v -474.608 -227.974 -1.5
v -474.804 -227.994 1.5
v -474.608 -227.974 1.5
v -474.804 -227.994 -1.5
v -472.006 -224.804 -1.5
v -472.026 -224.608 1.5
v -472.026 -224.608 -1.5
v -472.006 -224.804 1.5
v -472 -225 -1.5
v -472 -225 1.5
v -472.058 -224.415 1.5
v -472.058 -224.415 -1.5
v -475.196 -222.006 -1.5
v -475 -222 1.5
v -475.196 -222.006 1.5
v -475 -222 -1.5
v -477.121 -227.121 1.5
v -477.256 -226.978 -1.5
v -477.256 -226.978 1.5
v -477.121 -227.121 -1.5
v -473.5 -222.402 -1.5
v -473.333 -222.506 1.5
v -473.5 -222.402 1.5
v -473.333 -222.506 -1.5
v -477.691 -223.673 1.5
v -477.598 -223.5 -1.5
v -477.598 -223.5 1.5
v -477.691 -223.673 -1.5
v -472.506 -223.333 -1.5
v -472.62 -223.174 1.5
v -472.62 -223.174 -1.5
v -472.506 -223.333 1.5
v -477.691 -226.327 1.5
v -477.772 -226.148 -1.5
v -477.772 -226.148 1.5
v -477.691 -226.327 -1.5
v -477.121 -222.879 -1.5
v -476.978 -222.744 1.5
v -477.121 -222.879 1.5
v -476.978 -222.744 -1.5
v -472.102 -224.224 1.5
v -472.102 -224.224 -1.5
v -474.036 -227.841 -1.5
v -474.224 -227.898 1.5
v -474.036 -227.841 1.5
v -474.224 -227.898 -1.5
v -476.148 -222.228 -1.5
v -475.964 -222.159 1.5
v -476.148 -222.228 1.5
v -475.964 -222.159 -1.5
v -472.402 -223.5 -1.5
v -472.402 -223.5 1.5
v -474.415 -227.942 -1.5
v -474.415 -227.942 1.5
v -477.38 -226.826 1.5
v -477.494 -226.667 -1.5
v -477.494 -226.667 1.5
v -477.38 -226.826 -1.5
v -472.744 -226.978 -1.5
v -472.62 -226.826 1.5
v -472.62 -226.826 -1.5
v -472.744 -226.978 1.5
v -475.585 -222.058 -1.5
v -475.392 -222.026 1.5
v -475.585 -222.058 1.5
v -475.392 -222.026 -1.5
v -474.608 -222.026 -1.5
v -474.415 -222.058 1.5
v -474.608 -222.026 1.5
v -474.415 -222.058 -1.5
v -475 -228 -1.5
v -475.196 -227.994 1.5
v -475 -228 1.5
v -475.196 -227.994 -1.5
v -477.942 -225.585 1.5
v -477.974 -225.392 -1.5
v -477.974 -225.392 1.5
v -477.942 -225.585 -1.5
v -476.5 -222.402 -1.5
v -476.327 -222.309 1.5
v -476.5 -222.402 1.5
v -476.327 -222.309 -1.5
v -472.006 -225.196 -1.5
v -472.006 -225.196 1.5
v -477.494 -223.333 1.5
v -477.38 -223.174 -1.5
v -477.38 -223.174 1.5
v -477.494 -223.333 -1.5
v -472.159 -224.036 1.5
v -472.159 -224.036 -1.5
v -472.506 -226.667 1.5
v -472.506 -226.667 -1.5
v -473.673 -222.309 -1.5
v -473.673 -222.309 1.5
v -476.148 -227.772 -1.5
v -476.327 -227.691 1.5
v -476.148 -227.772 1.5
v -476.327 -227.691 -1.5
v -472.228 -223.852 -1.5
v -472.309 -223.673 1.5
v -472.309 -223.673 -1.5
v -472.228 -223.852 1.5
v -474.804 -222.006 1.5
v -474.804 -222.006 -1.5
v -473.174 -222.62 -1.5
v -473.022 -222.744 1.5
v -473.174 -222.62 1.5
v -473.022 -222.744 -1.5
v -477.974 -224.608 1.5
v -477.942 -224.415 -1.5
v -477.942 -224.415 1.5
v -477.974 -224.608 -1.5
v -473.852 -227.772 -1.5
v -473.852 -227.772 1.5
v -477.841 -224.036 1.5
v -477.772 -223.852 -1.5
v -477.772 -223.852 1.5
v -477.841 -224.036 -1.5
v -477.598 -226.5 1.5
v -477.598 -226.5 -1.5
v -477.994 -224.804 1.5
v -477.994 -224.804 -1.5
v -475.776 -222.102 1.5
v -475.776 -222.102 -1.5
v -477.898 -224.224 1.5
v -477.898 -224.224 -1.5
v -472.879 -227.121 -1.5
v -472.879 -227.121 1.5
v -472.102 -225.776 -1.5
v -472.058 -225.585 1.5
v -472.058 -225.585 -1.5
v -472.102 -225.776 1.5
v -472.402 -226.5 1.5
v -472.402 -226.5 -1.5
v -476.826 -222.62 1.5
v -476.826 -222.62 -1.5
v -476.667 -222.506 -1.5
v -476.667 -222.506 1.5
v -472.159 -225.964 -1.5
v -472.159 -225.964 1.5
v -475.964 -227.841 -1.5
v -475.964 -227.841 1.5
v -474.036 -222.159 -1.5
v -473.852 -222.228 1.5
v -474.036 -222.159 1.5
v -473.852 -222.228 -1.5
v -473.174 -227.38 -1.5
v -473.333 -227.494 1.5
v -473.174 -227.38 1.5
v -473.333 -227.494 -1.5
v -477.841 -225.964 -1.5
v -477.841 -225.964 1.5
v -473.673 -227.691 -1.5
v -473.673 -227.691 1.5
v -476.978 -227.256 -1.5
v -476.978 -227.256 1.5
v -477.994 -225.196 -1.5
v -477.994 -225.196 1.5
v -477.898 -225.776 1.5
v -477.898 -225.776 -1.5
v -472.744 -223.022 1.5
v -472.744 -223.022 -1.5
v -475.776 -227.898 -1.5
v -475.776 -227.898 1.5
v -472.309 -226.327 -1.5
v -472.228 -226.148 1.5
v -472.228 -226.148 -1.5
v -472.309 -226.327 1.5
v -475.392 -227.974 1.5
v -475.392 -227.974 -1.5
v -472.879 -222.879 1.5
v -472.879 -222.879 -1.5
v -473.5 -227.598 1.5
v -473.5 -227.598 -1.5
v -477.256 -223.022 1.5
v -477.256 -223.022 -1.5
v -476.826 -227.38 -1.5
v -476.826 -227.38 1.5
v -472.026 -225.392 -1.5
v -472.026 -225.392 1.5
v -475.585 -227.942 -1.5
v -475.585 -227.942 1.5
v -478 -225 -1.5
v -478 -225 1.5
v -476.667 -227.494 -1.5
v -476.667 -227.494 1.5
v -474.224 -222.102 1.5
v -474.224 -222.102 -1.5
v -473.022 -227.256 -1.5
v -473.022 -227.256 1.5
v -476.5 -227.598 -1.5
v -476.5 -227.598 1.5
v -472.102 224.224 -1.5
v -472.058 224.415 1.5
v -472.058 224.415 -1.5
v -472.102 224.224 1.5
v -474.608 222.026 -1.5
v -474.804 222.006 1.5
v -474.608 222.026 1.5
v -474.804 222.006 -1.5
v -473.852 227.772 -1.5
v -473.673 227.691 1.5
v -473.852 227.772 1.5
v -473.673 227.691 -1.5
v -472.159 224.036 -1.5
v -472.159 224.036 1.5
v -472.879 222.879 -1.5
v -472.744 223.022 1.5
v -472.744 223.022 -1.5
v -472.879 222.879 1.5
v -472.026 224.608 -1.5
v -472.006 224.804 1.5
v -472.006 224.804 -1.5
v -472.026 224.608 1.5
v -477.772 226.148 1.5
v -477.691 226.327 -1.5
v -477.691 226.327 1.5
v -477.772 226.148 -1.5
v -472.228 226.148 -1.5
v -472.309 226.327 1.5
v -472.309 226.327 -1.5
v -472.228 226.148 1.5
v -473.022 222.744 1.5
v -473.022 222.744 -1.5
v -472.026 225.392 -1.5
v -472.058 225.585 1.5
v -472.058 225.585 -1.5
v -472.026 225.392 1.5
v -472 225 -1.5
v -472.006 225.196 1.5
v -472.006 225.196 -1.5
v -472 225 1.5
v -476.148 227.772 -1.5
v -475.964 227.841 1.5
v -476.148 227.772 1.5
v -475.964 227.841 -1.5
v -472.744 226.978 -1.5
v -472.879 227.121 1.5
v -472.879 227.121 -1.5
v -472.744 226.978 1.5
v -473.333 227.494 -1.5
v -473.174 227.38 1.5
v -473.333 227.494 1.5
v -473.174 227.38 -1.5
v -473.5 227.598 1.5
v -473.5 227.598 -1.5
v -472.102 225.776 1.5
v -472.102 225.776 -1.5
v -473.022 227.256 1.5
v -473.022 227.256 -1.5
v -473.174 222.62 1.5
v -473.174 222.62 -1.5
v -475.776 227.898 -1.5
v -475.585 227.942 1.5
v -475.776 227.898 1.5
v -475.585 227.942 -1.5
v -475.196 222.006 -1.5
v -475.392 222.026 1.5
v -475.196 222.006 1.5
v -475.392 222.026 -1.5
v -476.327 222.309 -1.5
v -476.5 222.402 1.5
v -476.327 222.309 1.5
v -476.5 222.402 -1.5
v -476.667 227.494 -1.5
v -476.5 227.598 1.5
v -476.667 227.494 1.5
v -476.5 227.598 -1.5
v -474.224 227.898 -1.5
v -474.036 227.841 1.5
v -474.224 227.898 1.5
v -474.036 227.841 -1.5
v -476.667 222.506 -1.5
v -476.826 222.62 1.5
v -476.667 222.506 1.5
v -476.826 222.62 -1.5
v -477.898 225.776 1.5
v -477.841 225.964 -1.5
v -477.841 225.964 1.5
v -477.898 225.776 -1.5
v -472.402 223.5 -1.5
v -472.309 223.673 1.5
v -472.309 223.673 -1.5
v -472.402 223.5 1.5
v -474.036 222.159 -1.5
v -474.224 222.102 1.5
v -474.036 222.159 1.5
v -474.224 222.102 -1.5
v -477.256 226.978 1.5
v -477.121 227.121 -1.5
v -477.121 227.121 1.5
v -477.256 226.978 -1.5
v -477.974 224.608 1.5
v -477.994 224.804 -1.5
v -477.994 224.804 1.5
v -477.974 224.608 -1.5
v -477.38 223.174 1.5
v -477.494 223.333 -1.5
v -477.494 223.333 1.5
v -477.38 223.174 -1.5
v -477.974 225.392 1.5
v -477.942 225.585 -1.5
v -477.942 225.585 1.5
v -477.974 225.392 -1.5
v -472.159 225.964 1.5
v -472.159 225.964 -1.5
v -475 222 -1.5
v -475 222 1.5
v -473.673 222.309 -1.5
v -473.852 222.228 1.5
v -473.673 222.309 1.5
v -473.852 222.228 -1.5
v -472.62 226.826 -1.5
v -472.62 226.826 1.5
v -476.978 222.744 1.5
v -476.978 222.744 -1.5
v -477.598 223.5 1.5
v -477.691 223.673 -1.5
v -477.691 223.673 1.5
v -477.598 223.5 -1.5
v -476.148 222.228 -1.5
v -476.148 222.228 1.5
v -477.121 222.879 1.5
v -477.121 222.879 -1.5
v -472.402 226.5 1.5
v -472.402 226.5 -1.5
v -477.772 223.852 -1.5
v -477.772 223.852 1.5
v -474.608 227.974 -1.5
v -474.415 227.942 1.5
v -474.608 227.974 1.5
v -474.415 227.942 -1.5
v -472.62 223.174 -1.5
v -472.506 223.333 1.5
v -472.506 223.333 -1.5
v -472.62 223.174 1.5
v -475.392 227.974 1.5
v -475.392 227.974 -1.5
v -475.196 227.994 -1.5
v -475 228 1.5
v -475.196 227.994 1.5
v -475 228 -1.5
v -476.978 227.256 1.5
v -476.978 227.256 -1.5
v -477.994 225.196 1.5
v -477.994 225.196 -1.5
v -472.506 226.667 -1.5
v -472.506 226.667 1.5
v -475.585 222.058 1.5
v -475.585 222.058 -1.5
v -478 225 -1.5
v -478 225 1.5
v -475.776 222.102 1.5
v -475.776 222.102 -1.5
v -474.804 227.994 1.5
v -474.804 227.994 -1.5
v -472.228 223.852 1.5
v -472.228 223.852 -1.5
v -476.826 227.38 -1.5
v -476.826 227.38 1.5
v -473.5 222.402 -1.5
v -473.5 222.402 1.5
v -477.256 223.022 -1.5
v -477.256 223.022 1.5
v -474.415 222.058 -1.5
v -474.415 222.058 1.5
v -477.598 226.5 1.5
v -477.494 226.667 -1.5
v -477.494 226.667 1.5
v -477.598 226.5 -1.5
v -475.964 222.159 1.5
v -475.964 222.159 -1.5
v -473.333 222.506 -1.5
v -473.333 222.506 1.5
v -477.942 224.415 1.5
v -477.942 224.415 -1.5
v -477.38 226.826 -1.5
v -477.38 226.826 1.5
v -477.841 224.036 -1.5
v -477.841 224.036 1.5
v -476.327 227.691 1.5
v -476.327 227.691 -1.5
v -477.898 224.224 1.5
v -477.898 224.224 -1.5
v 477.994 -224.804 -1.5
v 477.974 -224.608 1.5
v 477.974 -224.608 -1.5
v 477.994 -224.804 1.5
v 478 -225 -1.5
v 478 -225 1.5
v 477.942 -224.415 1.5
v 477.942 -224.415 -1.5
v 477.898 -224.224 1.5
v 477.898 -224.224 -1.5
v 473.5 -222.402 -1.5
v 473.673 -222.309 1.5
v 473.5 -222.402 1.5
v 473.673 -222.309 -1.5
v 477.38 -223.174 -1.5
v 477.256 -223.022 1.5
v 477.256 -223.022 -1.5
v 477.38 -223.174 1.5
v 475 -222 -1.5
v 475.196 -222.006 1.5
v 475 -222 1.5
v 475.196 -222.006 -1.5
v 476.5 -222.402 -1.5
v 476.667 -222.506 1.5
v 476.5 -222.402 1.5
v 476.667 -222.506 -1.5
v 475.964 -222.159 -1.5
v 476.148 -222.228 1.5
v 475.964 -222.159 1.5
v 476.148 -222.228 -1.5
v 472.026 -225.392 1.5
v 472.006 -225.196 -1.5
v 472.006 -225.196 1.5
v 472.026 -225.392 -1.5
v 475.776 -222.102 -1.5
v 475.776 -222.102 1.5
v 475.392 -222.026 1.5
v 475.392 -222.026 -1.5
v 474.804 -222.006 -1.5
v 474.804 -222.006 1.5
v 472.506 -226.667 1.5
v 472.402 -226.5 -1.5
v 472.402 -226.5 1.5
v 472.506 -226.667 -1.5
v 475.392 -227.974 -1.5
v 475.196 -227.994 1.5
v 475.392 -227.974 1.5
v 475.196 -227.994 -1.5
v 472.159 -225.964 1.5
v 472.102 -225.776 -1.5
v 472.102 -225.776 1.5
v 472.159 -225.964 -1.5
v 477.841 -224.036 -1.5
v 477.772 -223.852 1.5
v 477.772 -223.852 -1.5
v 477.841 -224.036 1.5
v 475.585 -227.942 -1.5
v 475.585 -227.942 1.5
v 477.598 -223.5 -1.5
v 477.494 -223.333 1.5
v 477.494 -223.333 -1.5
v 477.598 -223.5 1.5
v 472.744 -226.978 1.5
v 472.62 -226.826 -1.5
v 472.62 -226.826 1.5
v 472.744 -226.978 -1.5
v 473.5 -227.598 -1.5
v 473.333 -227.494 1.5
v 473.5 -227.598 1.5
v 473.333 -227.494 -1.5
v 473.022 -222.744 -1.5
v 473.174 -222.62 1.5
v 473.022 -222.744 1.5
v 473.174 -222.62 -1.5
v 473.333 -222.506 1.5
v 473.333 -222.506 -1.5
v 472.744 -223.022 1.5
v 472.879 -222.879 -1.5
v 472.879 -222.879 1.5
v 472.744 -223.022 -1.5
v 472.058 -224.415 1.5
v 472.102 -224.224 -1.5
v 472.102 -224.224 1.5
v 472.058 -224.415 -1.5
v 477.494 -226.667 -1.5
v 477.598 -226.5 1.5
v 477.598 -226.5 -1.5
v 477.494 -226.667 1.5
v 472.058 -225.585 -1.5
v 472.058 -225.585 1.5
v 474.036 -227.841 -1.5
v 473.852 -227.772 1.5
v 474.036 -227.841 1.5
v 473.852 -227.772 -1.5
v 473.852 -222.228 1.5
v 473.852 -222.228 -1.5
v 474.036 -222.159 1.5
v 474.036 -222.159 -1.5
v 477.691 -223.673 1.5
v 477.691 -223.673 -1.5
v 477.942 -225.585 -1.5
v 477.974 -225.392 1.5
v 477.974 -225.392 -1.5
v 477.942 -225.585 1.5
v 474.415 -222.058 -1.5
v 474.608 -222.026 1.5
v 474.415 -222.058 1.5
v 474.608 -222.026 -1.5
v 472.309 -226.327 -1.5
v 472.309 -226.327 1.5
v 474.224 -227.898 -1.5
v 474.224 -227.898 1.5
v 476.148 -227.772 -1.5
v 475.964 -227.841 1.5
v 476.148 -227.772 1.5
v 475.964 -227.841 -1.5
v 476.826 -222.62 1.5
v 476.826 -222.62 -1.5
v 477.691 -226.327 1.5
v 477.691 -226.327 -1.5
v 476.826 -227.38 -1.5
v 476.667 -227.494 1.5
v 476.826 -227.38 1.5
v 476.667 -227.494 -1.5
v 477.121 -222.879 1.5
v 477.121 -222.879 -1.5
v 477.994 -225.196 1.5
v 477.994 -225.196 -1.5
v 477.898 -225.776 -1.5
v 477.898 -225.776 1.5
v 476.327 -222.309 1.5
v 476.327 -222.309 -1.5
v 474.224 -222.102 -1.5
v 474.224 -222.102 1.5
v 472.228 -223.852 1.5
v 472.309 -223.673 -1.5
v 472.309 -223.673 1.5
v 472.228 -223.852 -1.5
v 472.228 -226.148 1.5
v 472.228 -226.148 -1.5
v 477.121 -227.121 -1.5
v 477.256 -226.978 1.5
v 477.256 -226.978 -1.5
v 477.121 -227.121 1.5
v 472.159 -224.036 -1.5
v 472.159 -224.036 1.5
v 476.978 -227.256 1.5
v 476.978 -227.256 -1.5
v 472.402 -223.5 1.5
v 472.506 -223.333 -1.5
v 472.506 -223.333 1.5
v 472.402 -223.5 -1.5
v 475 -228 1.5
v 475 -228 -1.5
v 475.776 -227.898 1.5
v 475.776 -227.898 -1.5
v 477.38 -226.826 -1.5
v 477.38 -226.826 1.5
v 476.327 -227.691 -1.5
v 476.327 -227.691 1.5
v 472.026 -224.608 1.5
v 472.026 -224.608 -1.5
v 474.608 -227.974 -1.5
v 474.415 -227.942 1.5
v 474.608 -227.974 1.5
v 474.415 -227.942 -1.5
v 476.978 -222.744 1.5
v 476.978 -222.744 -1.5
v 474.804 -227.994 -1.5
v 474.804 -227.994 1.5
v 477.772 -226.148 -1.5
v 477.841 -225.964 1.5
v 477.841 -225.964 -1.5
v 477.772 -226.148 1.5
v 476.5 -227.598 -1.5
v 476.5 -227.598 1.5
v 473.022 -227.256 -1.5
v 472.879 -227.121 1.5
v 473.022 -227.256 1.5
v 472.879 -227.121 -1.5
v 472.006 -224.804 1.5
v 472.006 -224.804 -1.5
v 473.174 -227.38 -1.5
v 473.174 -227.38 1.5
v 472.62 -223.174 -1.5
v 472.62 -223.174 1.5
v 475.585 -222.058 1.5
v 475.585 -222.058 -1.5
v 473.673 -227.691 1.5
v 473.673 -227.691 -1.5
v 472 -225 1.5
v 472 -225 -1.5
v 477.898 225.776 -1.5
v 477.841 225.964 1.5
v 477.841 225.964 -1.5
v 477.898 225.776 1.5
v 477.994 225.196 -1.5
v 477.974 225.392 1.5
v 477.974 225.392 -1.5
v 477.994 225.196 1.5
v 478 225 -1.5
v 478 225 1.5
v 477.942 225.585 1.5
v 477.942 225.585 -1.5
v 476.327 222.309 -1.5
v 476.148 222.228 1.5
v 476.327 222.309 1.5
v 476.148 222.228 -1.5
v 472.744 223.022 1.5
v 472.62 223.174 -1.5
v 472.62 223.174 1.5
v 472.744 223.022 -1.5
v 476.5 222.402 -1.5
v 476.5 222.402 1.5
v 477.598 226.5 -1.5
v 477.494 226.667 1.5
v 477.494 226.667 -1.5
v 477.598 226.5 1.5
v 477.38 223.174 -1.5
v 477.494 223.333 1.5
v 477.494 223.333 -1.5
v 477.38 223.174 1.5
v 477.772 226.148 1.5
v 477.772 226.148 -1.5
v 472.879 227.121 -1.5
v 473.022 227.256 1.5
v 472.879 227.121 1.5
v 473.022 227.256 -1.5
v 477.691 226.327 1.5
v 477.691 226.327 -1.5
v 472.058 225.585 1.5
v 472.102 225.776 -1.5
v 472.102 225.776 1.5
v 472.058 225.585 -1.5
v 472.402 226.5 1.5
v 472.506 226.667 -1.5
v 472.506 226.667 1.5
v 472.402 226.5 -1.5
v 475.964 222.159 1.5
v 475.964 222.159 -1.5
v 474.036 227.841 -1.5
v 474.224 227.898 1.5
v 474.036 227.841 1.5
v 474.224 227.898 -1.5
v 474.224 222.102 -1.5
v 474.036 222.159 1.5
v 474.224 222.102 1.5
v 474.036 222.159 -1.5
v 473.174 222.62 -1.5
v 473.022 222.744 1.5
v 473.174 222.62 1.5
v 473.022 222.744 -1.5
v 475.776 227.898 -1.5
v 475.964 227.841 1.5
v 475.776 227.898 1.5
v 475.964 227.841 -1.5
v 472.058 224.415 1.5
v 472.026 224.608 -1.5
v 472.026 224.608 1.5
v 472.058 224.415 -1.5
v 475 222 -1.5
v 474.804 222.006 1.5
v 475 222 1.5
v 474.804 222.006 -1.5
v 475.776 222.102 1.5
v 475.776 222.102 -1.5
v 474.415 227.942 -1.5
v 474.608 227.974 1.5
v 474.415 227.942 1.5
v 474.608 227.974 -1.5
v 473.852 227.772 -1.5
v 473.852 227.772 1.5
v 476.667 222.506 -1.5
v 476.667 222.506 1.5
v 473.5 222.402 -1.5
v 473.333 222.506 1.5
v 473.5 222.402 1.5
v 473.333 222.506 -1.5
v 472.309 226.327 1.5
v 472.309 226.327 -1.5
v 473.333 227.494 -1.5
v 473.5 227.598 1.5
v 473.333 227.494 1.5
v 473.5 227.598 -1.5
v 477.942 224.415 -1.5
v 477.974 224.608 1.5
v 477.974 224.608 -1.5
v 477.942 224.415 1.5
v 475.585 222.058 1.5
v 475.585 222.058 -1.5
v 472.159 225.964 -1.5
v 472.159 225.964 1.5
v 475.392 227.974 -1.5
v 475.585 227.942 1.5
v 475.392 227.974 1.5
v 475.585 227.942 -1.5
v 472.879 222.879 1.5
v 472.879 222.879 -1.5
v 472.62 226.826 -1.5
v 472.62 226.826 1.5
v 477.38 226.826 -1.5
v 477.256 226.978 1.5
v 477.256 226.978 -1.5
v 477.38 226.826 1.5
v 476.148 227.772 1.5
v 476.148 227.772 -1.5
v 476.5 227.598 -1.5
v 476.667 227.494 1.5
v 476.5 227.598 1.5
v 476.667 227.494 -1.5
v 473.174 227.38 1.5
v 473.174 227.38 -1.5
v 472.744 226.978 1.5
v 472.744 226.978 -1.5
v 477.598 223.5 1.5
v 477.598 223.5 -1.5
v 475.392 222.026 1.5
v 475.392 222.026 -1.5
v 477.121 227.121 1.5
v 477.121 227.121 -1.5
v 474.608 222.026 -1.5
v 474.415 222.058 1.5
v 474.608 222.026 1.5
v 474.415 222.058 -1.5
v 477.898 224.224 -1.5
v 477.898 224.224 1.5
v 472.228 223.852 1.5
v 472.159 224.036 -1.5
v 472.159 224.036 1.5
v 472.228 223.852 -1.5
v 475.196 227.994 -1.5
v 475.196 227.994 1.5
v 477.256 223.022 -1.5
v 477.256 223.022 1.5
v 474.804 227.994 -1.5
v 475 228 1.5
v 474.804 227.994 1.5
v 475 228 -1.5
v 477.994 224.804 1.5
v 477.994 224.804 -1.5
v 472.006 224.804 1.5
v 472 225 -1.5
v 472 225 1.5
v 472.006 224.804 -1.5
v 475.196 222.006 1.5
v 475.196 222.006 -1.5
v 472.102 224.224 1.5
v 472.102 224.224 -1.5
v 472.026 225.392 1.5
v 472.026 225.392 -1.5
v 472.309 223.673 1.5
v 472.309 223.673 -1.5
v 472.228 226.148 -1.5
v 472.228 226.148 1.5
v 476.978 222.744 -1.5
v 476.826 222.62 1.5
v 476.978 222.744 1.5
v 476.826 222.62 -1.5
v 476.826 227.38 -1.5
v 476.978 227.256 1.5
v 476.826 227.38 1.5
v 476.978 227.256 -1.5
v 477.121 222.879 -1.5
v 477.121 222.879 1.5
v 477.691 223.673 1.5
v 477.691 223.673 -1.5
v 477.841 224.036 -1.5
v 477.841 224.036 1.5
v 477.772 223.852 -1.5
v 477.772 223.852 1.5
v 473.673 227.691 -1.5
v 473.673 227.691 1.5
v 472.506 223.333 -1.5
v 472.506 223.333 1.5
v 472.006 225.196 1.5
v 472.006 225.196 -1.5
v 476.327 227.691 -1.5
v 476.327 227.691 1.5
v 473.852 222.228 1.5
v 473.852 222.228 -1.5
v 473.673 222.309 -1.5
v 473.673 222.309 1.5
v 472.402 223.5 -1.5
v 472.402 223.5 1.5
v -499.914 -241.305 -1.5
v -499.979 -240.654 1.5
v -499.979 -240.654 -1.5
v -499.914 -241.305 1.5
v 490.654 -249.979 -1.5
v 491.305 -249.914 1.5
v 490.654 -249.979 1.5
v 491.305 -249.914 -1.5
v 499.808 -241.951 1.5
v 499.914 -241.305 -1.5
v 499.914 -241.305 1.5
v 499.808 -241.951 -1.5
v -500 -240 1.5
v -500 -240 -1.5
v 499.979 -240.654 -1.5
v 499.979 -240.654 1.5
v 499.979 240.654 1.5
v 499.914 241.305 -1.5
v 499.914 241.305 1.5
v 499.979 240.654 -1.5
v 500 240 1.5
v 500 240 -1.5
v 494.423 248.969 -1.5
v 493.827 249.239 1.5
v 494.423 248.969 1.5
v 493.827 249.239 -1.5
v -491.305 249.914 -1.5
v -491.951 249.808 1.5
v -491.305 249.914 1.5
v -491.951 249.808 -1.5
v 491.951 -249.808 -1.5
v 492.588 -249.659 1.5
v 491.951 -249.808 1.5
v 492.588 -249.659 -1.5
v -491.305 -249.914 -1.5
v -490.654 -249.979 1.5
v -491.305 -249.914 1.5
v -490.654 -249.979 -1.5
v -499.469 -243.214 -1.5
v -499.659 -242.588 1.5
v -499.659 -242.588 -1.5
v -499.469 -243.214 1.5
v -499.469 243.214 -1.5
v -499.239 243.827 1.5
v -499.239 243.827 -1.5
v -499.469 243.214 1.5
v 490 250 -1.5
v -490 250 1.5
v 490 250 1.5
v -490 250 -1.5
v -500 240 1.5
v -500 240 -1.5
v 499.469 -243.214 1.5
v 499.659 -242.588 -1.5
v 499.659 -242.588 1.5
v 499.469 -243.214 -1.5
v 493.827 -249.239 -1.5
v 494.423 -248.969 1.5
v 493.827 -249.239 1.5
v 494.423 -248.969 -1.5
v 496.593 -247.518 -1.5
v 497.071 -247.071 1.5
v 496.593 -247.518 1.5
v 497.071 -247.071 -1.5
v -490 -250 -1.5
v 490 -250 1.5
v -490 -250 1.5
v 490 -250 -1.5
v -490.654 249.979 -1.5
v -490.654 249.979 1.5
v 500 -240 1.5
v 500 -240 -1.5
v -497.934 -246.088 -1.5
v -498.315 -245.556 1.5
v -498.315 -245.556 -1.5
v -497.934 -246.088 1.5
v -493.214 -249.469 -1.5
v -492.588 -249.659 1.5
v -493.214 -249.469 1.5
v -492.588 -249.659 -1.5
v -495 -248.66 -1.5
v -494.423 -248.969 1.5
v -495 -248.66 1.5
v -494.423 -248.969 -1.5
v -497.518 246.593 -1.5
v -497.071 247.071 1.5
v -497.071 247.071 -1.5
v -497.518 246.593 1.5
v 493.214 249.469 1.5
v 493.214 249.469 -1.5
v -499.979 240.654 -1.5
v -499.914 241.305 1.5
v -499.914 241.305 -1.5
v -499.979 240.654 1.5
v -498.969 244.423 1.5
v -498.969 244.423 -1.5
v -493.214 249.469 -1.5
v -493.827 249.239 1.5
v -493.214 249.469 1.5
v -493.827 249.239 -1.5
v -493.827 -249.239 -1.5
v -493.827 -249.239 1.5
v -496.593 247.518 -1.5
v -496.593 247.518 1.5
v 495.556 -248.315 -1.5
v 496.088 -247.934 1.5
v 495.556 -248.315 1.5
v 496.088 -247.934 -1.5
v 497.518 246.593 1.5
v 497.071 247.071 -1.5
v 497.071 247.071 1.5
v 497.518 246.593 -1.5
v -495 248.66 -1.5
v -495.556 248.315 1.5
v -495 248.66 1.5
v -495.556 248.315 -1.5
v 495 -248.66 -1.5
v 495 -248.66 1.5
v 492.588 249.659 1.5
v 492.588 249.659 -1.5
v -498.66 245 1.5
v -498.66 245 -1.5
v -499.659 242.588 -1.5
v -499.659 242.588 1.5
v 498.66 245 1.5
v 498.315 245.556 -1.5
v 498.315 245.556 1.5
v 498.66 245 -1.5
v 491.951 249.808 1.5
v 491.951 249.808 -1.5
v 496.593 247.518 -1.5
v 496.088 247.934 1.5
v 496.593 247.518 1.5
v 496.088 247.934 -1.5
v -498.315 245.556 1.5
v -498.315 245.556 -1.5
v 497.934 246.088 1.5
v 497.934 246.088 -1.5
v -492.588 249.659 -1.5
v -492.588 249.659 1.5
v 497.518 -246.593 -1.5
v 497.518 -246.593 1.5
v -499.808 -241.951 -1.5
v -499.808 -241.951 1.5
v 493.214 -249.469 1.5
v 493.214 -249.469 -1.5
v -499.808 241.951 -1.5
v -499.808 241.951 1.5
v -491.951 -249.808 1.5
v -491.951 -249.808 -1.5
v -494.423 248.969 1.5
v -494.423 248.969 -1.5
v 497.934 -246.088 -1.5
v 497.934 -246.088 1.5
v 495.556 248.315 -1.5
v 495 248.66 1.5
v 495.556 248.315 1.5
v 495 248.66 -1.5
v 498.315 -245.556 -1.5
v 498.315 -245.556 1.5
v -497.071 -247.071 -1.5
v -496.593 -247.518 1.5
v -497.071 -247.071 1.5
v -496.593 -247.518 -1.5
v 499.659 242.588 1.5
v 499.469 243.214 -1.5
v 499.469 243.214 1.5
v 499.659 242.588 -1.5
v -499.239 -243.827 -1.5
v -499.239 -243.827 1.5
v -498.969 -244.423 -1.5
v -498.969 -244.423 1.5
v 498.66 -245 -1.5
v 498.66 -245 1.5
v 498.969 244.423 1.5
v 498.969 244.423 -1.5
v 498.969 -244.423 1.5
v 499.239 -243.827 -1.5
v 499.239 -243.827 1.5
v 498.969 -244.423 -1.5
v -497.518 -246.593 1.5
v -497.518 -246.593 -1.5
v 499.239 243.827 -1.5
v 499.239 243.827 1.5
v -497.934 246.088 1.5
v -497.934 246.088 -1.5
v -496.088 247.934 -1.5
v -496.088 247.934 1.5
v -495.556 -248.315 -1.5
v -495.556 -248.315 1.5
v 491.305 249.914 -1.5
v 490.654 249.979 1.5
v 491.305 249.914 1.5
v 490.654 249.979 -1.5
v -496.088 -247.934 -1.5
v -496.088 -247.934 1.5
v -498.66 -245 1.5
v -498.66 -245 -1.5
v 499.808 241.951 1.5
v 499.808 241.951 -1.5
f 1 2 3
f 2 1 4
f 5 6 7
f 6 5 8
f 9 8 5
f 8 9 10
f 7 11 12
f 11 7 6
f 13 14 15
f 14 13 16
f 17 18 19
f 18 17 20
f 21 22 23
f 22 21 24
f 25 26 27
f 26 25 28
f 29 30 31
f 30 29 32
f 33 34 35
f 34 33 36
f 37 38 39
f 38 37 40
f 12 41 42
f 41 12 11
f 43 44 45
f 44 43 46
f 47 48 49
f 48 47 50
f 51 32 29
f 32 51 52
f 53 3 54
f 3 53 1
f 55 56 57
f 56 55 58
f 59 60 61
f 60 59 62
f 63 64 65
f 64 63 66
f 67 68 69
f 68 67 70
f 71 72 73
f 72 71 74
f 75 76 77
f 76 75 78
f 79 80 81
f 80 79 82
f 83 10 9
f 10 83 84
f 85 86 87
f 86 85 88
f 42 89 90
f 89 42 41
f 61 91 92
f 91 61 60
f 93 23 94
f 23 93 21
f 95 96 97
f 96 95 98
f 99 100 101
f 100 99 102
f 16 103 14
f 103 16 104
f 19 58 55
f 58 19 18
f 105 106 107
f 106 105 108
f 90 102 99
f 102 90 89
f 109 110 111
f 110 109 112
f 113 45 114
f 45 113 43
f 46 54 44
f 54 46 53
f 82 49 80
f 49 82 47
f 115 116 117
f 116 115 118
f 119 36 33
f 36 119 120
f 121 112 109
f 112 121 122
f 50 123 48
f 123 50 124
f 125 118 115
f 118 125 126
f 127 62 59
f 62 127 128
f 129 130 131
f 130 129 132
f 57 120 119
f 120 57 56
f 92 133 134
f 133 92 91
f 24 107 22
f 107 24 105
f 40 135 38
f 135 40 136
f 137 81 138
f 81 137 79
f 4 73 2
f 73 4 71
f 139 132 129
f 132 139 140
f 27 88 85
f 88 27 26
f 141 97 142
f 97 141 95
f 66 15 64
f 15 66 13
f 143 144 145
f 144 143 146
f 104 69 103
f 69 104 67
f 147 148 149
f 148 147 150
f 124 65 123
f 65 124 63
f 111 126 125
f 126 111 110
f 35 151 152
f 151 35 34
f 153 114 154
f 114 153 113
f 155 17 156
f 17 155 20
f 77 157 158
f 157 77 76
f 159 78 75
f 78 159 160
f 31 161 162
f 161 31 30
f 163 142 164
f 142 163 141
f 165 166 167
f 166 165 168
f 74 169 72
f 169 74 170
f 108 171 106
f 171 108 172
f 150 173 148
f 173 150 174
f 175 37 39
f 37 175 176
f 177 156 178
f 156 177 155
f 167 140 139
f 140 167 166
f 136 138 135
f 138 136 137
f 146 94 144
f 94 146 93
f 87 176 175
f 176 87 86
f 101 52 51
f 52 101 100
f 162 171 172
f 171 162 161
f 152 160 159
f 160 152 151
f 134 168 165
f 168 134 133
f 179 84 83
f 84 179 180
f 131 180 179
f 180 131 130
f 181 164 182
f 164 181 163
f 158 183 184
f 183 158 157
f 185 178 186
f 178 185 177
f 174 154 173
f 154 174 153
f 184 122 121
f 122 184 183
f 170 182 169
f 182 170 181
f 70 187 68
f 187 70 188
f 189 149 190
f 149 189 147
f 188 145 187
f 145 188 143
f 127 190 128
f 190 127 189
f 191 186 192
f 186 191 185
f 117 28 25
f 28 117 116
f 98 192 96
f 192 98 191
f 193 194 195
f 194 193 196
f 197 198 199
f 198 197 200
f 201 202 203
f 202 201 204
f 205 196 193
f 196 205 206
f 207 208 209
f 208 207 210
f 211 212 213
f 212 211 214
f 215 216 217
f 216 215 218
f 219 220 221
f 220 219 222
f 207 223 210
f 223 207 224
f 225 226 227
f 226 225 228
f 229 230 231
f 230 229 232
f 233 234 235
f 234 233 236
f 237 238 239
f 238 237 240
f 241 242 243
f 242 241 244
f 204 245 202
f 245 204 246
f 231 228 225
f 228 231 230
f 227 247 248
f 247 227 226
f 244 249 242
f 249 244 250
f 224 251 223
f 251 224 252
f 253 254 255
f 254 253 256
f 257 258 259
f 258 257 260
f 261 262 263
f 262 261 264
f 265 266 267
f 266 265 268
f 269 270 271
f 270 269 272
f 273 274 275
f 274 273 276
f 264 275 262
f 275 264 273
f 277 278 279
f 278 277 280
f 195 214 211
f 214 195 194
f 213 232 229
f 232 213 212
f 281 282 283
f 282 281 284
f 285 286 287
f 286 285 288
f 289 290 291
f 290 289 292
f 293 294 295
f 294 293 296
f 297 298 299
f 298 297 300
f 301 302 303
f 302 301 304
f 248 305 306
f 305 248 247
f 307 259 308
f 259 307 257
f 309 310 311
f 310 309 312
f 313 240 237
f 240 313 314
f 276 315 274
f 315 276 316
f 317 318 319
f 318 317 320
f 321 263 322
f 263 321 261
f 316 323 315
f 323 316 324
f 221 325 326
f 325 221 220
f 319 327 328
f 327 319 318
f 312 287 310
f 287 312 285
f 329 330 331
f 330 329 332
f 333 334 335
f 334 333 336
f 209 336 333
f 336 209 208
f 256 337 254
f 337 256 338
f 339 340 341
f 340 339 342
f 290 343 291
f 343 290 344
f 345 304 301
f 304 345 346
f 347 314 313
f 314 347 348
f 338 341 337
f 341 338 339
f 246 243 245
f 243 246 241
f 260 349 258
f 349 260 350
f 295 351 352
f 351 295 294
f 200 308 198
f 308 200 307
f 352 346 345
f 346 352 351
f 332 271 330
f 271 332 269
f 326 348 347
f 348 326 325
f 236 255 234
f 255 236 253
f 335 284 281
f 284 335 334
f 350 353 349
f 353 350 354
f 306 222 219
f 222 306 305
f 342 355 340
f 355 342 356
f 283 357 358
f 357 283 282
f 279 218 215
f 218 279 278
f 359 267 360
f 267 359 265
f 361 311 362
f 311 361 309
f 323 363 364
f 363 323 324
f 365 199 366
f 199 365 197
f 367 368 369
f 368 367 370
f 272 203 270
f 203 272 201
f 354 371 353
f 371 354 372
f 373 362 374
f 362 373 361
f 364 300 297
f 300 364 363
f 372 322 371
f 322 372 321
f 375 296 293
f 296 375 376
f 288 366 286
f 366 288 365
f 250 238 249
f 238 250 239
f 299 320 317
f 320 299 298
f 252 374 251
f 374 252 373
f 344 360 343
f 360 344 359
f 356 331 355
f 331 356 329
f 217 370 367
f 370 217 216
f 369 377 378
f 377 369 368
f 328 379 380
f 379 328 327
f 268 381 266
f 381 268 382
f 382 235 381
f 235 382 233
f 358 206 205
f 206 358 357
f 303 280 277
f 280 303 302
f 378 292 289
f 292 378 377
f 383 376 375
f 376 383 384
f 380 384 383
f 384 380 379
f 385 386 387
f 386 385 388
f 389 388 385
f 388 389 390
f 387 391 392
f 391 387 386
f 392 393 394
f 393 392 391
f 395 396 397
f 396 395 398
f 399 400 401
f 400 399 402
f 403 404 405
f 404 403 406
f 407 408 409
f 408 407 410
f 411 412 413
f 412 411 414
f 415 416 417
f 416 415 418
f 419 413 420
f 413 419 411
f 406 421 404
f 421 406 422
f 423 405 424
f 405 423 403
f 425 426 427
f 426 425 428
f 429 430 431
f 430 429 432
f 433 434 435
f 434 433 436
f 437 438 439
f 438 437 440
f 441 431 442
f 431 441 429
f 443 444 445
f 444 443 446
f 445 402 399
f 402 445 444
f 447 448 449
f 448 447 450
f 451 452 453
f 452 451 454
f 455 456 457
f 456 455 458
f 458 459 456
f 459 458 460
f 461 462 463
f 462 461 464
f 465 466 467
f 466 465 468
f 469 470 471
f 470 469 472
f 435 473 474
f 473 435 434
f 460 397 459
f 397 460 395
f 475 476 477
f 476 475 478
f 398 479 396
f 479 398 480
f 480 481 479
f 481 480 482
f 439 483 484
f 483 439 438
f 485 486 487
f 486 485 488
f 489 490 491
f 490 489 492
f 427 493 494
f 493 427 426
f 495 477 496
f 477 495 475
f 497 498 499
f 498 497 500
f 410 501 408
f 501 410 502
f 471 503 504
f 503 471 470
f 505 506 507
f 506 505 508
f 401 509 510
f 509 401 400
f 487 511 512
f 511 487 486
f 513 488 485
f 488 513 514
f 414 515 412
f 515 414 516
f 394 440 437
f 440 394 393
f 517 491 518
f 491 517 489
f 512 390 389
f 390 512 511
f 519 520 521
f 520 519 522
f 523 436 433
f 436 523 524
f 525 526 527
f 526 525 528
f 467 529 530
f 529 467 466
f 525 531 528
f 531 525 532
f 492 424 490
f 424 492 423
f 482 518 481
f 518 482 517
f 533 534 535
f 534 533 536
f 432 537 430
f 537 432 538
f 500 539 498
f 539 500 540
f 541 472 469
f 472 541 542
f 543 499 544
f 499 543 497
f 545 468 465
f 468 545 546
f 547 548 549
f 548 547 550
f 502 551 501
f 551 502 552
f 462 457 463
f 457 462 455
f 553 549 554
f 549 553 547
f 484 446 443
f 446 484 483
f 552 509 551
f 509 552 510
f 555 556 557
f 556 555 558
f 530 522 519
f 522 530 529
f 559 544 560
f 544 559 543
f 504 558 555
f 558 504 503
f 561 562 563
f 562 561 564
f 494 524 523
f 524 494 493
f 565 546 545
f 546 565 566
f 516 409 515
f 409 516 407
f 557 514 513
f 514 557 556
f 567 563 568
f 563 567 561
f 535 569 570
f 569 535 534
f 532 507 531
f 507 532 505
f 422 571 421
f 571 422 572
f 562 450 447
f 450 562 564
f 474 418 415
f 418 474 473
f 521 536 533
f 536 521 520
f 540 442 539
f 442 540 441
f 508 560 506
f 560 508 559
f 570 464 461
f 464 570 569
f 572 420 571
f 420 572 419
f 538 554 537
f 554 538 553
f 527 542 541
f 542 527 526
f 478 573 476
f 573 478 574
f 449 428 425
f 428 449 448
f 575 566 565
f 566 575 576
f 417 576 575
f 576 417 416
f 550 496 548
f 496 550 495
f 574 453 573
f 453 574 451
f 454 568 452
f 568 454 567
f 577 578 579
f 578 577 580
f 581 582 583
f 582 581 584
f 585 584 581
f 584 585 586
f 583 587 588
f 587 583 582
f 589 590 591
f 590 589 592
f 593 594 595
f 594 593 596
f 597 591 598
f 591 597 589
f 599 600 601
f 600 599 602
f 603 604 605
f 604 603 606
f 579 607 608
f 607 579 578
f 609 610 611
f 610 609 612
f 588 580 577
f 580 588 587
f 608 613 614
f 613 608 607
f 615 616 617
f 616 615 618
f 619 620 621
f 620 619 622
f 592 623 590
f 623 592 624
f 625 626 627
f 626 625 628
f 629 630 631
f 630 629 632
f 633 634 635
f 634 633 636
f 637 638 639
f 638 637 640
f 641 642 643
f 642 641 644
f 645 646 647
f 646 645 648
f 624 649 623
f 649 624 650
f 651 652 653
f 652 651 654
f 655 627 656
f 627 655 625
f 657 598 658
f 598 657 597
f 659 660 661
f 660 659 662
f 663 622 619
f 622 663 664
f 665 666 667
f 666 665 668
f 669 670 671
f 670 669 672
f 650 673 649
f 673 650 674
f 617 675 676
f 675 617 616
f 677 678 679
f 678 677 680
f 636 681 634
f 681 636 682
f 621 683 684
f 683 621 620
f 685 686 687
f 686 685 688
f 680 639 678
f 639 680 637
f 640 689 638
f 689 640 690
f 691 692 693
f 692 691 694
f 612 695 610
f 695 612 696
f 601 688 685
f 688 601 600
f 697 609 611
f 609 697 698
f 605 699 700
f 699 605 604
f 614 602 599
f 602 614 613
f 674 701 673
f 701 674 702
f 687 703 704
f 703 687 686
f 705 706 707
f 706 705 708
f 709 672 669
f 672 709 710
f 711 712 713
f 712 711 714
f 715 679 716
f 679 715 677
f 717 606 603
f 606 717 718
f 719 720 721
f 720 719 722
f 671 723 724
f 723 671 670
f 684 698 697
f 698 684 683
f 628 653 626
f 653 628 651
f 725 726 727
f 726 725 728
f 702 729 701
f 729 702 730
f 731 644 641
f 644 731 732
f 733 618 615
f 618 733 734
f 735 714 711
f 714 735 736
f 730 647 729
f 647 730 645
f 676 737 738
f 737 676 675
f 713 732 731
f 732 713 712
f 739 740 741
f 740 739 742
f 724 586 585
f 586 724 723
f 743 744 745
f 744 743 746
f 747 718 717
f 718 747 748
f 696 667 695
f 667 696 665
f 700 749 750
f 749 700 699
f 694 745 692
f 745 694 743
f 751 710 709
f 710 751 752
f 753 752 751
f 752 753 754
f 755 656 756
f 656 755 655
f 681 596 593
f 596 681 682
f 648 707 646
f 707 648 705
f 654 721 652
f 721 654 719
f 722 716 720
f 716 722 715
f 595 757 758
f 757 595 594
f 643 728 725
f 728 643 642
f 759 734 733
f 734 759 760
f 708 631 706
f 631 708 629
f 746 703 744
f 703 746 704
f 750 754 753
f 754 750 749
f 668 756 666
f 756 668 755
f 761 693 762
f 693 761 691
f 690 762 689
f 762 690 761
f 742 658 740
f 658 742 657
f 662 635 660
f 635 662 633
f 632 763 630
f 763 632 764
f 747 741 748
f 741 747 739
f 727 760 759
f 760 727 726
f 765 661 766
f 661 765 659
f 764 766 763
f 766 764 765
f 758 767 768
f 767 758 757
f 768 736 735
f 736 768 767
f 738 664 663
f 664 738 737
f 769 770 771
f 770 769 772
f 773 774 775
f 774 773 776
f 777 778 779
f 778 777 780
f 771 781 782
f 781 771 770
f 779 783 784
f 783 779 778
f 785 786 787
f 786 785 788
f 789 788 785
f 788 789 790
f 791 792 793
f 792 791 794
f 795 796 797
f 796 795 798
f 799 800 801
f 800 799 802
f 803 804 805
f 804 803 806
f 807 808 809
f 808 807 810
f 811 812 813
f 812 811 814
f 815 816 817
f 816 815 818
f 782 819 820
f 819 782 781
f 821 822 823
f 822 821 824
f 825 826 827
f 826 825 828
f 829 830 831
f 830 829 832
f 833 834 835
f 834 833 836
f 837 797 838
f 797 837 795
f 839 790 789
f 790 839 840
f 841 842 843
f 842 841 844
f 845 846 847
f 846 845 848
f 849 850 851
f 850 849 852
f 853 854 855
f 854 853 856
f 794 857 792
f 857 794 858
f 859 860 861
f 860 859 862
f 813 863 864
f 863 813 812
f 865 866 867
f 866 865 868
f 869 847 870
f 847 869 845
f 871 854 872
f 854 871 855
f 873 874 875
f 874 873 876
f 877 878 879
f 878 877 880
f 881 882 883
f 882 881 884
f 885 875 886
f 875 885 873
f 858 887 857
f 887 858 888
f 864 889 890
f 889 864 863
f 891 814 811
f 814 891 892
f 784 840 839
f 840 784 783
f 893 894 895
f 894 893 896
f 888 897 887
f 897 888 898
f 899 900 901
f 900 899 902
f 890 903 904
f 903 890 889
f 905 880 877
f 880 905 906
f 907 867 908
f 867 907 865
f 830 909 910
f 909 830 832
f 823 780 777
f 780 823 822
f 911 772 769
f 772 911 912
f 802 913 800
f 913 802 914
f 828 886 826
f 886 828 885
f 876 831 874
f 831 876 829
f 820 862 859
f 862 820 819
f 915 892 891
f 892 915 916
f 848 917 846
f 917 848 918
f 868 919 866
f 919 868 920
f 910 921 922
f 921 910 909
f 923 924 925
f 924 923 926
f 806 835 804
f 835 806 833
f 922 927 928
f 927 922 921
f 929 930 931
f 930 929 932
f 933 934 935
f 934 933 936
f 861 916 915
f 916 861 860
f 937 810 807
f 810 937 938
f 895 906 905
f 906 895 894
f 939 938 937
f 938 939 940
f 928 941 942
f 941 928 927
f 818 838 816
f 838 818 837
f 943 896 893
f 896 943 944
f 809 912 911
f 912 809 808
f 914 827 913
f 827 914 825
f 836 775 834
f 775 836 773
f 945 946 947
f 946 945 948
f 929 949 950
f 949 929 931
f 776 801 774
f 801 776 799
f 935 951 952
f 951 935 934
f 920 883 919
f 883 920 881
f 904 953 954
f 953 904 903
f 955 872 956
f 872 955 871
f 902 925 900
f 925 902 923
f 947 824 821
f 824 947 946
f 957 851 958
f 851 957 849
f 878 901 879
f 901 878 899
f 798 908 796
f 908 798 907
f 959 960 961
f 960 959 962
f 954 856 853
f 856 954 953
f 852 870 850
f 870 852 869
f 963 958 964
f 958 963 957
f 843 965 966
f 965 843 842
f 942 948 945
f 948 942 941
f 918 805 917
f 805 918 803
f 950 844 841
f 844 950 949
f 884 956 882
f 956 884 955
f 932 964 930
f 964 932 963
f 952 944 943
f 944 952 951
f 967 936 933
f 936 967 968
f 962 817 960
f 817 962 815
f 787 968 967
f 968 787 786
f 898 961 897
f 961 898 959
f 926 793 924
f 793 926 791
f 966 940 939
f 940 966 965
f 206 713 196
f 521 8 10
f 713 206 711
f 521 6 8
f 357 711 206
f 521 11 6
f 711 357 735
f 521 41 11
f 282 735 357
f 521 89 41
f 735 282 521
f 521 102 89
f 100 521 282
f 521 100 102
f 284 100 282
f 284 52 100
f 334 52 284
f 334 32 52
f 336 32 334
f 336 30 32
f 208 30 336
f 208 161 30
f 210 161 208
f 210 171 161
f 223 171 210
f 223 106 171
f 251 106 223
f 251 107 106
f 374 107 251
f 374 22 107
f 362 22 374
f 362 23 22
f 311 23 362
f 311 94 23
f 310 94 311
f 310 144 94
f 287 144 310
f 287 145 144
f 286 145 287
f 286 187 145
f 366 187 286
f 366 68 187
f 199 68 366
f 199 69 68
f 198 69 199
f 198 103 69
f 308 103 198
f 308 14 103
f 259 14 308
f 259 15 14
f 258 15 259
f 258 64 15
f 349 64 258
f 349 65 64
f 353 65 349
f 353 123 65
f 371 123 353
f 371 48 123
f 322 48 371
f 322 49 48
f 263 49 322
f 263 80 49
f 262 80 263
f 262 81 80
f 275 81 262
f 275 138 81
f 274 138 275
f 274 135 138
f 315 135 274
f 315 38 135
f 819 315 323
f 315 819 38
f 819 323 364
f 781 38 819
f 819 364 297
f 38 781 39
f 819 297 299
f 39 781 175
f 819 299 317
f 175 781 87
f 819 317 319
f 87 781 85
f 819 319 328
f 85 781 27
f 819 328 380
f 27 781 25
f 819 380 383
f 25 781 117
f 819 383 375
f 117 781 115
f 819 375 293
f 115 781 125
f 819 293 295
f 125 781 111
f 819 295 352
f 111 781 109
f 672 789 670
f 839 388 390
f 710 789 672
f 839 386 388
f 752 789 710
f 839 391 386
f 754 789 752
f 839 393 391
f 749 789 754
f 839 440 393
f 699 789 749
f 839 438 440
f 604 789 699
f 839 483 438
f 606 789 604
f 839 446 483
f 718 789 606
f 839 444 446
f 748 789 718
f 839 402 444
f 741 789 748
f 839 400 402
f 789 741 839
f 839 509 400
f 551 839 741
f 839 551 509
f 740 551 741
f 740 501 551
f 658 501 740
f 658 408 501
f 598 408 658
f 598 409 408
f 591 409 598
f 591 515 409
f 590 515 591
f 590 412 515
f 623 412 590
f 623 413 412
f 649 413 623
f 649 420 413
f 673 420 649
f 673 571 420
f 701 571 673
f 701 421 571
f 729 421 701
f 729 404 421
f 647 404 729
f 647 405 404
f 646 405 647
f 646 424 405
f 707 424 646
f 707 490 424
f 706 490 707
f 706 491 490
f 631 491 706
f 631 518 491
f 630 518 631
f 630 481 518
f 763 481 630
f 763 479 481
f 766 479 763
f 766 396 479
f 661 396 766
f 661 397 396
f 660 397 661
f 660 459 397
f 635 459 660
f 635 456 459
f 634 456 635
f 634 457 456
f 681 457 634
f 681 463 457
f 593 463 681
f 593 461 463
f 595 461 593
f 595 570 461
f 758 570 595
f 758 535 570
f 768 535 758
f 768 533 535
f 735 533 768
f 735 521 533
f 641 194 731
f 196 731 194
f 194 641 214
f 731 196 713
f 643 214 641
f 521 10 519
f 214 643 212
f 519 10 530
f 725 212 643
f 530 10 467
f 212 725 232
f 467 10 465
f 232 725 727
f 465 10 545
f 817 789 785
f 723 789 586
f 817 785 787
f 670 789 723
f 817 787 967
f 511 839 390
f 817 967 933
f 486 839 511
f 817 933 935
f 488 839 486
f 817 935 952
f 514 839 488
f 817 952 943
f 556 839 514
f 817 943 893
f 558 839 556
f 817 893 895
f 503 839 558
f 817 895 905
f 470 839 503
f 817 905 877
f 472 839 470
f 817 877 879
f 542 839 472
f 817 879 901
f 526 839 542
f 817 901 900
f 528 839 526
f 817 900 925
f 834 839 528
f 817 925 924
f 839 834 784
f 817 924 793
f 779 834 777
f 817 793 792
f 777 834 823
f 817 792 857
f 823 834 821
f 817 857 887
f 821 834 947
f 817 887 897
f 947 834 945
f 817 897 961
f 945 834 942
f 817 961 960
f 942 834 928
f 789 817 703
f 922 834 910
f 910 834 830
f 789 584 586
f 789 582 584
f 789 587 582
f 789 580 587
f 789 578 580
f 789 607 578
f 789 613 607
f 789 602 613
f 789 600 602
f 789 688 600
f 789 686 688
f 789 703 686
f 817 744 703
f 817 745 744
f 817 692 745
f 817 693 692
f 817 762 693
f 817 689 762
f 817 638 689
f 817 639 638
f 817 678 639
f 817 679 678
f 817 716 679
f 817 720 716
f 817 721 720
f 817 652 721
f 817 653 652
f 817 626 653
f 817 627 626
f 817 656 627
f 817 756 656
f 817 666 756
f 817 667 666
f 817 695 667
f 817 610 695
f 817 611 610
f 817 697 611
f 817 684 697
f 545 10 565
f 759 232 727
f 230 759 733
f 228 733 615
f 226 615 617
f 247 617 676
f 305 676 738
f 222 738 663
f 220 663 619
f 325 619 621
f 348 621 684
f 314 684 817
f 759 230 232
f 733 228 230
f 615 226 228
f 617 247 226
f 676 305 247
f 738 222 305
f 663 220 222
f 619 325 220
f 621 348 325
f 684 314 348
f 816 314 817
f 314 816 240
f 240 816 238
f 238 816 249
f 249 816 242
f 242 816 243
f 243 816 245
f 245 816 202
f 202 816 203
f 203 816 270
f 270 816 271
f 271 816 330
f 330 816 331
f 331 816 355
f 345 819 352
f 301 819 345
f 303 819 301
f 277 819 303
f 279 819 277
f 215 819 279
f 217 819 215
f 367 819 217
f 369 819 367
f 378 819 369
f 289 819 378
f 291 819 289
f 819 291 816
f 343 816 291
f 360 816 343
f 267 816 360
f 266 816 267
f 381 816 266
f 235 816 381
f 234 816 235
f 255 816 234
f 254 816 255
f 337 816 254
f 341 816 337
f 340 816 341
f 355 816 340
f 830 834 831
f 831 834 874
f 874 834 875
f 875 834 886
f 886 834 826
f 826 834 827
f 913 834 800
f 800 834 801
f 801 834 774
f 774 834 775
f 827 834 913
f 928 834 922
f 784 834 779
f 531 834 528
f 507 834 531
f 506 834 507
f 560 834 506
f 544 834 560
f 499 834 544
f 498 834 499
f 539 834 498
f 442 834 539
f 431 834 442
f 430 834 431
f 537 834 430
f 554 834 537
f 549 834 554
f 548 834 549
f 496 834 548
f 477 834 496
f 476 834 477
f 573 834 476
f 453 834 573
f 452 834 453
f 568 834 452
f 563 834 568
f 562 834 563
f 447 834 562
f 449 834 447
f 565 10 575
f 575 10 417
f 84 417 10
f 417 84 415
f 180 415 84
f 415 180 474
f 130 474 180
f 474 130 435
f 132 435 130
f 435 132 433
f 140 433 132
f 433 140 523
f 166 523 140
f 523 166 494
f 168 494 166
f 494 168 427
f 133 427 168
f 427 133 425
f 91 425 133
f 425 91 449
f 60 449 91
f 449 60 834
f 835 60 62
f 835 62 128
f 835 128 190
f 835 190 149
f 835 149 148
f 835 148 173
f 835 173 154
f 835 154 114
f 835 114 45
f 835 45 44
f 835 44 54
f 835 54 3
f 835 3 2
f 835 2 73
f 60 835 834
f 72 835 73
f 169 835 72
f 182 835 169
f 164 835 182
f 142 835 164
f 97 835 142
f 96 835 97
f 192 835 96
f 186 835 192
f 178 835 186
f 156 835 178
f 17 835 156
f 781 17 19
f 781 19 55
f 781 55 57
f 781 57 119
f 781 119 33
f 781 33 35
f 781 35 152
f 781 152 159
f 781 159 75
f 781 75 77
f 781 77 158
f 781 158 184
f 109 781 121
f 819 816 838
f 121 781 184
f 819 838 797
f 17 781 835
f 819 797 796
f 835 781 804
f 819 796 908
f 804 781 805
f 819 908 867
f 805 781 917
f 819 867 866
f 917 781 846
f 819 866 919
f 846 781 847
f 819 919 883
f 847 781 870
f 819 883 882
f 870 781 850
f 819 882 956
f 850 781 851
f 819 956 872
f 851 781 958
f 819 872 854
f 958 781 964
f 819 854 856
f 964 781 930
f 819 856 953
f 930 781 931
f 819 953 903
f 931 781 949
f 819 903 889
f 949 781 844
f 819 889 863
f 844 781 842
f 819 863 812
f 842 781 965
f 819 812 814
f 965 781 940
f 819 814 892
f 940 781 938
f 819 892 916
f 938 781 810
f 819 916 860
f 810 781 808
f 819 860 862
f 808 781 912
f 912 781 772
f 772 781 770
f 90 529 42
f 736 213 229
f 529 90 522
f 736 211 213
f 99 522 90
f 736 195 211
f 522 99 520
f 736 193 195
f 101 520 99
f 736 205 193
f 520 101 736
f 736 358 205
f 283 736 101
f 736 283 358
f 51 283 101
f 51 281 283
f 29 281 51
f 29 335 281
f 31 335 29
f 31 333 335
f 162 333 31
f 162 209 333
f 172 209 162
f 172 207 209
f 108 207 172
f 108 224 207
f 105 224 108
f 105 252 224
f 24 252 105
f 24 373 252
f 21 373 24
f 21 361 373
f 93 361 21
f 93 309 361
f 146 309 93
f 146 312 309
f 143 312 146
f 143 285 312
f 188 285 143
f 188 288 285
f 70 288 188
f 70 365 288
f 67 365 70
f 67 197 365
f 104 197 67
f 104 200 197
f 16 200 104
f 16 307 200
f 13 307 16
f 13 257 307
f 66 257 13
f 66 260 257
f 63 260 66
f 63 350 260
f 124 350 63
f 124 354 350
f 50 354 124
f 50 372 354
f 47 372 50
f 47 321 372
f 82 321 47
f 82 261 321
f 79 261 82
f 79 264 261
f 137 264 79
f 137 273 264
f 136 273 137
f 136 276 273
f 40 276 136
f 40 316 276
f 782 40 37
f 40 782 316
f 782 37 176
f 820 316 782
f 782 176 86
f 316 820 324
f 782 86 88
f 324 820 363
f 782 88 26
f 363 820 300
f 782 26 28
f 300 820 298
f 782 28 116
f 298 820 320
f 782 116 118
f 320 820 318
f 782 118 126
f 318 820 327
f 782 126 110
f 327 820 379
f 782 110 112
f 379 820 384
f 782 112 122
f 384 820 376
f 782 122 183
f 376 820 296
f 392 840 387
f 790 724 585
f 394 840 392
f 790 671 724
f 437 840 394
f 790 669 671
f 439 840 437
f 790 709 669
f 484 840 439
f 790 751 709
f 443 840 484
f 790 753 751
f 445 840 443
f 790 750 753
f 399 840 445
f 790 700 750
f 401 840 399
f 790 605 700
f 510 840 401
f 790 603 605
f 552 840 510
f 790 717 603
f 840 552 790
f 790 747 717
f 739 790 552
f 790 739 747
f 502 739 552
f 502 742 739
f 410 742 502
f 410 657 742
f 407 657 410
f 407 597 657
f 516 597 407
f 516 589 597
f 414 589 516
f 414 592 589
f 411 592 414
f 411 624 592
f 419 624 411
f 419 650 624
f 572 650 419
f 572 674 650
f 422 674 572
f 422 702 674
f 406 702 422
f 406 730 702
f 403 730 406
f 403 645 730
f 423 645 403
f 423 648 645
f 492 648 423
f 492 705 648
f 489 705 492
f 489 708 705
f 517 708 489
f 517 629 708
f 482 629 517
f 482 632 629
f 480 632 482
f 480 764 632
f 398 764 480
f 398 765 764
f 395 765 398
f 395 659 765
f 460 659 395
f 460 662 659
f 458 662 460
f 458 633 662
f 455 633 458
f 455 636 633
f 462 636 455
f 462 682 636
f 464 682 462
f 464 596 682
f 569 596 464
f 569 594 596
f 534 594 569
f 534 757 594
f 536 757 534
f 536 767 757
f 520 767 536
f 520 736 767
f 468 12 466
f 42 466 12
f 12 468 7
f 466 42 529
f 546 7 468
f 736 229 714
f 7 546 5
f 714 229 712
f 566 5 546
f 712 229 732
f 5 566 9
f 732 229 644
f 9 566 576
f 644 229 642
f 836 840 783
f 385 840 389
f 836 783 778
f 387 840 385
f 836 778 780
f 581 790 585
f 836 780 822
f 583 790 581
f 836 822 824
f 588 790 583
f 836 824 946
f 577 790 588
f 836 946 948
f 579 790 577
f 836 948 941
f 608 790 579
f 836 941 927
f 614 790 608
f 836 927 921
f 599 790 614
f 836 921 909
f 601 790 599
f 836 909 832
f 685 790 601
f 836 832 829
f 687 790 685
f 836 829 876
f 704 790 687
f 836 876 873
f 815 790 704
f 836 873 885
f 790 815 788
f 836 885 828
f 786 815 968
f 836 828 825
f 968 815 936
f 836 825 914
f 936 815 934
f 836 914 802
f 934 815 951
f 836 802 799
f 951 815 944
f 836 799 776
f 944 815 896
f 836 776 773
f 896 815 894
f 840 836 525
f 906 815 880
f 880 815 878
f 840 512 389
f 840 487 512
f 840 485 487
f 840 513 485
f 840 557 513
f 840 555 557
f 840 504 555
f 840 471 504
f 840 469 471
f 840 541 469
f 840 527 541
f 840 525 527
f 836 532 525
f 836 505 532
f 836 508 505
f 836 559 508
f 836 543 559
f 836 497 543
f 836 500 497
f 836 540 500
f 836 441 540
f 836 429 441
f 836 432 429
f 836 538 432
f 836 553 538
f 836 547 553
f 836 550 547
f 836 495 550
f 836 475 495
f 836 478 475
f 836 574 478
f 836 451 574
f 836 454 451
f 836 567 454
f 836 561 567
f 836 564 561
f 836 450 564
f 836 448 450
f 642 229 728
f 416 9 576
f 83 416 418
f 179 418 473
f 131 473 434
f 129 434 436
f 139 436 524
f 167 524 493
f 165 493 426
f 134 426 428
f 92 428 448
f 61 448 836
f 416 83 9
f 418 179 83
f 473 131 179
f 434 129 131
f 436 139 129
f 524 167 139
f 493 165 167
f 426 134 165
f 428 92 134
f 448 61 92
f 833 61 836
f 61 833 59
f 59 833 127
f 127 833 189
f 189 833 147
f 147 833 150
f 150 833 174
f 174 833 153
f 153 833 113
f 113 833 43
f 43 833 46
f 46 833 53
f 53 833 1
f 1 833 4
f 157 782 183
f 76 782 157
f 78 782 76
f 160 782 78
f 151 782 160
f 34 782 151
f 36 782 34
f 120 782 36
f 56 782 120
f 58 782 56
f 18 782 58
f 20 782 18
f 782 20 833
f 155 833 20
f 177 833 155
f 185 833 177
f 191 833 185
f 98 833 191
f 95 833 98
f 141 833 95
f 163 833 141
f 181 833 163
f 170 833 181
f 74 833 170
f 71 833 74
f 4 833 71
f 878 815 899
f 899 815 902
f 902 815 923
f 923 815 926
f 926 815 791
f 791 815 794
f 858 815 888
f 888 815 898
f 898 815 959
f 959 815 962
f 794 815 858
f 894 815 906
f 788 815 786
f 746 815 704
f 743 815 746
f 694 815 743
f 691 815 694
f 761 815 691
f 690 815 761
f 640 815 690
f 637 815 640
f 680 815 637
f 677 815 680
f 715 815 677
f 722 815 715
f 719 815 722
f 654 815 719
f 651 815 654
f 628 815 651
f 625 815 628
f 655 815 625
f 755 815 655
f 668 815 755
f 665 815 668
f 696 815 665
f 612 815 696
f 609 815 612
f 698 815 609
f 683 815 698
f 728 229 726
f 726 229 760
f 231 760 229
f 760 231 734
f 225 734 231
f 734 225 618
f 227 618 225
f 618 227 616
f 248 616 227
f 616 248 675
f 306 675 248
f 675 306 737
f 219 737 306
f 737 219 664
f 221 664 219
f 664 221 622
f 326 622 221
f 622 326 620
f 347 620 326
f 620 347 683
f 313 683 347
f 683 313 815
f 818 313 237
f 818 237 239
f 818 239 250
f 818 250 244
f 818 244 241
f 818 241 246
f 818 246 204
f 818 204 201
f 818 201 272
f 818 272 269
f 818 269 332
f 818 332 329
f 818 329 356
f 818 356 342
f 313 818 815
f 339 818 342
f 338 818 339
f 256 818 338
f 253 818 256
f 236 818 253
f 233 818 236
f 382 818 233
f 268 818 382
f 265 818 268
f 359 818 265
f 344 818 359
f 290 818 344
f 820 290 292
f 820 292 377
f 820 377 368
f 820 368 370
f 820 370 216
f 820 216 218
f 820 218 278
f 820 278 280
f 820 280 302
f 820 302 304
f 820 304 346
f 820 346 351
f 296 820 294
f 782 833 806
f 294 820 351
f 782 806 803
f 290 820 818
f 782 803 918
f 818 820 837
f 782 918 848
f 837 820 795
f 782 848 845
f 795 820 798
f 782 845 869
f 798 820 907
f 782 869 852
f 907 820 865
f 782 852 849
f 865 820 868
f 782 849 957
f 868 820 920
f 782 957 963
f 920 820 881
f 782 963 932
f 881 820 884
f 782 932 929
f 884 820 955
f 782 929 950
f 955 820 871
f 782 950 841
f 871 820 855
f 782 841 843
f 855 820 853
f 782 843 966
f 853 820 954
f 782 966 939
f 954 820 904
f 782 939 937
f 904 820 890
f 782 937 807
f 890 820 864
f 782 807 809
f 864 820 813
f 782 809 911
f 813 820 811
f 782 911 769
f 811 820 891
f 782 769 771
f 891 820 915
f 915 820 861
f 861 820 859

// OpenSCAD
// Sheet DiBond - corrected (non-blank, single connected solid)

// Parameters
sheet_length = 1000; //[500:2000:1]
sheet_width = 500;   //[250:1000:1]
sheet_thickness = 3; //[1.5:6:0.1]
corner_radius = 10;  //[0:40:1]
hole_diameter = 6;   //[2:12:0.5]
hole_edge_offset_x = 25; //[10:100:1]
hole_edge_offset_y = 25; //[10:100:1]
edge_chamfer = 1;    //[0:3:0.1]
overlap = 1;         //[0.5:2:0.1]

$fn = 96;

// Helpers
function clamp(v, lo, hi) = v < lo ? lo : (v > hi ? hi : v);

// Keep radii/offsets valid
cr = clamp(corner_radius, 0, min(sheet_length, sheet_width)/2);
hx = clamp(hole_edge_offset_x, hole_diameter/2 + 0.5, sheet_length/2 - hole_diameter/2 - 0.5);
hy = clamp(hole_edge_offset_y, hole_diameter/2 + 0.5, sheet_width/2  - hole_diameter/2 - 0.5);
ch = clamp(edge_chamfer, 0, min(sheet_thickness/2, min(sheet_length, sheet_width)/4));

// Rounded rectangle 2D profile
module rounded_rect_2d(L, W, R) {
    if (R <= 0) {
        square([L, W], center=true);
    } else {
        hull() {
            for (sx = [-1, 1], sy = [-1, 1])
                translate([sx*(L/2 - R), sy*(W/2 - R)])
                    circle(r=R);
        }
    }
}

// Main solid sheet with rounded corners
module sheet_solid() {
    linear_extrude(height=sheet_thickness, center=true, convexity=10)
        rounded_rect_2d(sheet_length, sheet_width, cr);
}

// Mounting holes (4 corners)
module mounting_holes() {
    for (sx = [-1, 1], sy = [-1, 1])
        translate([sx*(sheet_length/2 - hx), sy*(sheet_width/2 - hy), 0])
            cylinder(h=sheet_thickness + 2*overlap, r=hole_diameter/2, center=true);
}

// Edge chamfer cuts (simple corner bevels on top and bottom)
module chamfer_cuts() {
    if (ch > 0) {
        zc_top =  sheet_thickness/2 - ch/2;
        zc_bot = -sheet_thickness/2 + ch/2;

        for (sx = [-1, 1], sy = [-1, 1]) {
            translate([sx*(sheet_length/2 - ch/2), sy*(sheet_width/2 - ch/2), zc_top])
                rotate([0, 0, 45])
                    cube([2*ch, 2*ch, ch + 2*overlap], center=true);

            translate([sx*(sheet_length/2 - ch/2), sy*(sheet_width/2 - ch/2), zc_bot])
                rotate([0, 0, 45])
                    cube([2*ch, 2*ch, ch + 2*overlap], center=true);
        }
    }
}

// Final panel
difference() {
    sheet_solid();
    mounting_holes();
    chamfer_cuts();
}
